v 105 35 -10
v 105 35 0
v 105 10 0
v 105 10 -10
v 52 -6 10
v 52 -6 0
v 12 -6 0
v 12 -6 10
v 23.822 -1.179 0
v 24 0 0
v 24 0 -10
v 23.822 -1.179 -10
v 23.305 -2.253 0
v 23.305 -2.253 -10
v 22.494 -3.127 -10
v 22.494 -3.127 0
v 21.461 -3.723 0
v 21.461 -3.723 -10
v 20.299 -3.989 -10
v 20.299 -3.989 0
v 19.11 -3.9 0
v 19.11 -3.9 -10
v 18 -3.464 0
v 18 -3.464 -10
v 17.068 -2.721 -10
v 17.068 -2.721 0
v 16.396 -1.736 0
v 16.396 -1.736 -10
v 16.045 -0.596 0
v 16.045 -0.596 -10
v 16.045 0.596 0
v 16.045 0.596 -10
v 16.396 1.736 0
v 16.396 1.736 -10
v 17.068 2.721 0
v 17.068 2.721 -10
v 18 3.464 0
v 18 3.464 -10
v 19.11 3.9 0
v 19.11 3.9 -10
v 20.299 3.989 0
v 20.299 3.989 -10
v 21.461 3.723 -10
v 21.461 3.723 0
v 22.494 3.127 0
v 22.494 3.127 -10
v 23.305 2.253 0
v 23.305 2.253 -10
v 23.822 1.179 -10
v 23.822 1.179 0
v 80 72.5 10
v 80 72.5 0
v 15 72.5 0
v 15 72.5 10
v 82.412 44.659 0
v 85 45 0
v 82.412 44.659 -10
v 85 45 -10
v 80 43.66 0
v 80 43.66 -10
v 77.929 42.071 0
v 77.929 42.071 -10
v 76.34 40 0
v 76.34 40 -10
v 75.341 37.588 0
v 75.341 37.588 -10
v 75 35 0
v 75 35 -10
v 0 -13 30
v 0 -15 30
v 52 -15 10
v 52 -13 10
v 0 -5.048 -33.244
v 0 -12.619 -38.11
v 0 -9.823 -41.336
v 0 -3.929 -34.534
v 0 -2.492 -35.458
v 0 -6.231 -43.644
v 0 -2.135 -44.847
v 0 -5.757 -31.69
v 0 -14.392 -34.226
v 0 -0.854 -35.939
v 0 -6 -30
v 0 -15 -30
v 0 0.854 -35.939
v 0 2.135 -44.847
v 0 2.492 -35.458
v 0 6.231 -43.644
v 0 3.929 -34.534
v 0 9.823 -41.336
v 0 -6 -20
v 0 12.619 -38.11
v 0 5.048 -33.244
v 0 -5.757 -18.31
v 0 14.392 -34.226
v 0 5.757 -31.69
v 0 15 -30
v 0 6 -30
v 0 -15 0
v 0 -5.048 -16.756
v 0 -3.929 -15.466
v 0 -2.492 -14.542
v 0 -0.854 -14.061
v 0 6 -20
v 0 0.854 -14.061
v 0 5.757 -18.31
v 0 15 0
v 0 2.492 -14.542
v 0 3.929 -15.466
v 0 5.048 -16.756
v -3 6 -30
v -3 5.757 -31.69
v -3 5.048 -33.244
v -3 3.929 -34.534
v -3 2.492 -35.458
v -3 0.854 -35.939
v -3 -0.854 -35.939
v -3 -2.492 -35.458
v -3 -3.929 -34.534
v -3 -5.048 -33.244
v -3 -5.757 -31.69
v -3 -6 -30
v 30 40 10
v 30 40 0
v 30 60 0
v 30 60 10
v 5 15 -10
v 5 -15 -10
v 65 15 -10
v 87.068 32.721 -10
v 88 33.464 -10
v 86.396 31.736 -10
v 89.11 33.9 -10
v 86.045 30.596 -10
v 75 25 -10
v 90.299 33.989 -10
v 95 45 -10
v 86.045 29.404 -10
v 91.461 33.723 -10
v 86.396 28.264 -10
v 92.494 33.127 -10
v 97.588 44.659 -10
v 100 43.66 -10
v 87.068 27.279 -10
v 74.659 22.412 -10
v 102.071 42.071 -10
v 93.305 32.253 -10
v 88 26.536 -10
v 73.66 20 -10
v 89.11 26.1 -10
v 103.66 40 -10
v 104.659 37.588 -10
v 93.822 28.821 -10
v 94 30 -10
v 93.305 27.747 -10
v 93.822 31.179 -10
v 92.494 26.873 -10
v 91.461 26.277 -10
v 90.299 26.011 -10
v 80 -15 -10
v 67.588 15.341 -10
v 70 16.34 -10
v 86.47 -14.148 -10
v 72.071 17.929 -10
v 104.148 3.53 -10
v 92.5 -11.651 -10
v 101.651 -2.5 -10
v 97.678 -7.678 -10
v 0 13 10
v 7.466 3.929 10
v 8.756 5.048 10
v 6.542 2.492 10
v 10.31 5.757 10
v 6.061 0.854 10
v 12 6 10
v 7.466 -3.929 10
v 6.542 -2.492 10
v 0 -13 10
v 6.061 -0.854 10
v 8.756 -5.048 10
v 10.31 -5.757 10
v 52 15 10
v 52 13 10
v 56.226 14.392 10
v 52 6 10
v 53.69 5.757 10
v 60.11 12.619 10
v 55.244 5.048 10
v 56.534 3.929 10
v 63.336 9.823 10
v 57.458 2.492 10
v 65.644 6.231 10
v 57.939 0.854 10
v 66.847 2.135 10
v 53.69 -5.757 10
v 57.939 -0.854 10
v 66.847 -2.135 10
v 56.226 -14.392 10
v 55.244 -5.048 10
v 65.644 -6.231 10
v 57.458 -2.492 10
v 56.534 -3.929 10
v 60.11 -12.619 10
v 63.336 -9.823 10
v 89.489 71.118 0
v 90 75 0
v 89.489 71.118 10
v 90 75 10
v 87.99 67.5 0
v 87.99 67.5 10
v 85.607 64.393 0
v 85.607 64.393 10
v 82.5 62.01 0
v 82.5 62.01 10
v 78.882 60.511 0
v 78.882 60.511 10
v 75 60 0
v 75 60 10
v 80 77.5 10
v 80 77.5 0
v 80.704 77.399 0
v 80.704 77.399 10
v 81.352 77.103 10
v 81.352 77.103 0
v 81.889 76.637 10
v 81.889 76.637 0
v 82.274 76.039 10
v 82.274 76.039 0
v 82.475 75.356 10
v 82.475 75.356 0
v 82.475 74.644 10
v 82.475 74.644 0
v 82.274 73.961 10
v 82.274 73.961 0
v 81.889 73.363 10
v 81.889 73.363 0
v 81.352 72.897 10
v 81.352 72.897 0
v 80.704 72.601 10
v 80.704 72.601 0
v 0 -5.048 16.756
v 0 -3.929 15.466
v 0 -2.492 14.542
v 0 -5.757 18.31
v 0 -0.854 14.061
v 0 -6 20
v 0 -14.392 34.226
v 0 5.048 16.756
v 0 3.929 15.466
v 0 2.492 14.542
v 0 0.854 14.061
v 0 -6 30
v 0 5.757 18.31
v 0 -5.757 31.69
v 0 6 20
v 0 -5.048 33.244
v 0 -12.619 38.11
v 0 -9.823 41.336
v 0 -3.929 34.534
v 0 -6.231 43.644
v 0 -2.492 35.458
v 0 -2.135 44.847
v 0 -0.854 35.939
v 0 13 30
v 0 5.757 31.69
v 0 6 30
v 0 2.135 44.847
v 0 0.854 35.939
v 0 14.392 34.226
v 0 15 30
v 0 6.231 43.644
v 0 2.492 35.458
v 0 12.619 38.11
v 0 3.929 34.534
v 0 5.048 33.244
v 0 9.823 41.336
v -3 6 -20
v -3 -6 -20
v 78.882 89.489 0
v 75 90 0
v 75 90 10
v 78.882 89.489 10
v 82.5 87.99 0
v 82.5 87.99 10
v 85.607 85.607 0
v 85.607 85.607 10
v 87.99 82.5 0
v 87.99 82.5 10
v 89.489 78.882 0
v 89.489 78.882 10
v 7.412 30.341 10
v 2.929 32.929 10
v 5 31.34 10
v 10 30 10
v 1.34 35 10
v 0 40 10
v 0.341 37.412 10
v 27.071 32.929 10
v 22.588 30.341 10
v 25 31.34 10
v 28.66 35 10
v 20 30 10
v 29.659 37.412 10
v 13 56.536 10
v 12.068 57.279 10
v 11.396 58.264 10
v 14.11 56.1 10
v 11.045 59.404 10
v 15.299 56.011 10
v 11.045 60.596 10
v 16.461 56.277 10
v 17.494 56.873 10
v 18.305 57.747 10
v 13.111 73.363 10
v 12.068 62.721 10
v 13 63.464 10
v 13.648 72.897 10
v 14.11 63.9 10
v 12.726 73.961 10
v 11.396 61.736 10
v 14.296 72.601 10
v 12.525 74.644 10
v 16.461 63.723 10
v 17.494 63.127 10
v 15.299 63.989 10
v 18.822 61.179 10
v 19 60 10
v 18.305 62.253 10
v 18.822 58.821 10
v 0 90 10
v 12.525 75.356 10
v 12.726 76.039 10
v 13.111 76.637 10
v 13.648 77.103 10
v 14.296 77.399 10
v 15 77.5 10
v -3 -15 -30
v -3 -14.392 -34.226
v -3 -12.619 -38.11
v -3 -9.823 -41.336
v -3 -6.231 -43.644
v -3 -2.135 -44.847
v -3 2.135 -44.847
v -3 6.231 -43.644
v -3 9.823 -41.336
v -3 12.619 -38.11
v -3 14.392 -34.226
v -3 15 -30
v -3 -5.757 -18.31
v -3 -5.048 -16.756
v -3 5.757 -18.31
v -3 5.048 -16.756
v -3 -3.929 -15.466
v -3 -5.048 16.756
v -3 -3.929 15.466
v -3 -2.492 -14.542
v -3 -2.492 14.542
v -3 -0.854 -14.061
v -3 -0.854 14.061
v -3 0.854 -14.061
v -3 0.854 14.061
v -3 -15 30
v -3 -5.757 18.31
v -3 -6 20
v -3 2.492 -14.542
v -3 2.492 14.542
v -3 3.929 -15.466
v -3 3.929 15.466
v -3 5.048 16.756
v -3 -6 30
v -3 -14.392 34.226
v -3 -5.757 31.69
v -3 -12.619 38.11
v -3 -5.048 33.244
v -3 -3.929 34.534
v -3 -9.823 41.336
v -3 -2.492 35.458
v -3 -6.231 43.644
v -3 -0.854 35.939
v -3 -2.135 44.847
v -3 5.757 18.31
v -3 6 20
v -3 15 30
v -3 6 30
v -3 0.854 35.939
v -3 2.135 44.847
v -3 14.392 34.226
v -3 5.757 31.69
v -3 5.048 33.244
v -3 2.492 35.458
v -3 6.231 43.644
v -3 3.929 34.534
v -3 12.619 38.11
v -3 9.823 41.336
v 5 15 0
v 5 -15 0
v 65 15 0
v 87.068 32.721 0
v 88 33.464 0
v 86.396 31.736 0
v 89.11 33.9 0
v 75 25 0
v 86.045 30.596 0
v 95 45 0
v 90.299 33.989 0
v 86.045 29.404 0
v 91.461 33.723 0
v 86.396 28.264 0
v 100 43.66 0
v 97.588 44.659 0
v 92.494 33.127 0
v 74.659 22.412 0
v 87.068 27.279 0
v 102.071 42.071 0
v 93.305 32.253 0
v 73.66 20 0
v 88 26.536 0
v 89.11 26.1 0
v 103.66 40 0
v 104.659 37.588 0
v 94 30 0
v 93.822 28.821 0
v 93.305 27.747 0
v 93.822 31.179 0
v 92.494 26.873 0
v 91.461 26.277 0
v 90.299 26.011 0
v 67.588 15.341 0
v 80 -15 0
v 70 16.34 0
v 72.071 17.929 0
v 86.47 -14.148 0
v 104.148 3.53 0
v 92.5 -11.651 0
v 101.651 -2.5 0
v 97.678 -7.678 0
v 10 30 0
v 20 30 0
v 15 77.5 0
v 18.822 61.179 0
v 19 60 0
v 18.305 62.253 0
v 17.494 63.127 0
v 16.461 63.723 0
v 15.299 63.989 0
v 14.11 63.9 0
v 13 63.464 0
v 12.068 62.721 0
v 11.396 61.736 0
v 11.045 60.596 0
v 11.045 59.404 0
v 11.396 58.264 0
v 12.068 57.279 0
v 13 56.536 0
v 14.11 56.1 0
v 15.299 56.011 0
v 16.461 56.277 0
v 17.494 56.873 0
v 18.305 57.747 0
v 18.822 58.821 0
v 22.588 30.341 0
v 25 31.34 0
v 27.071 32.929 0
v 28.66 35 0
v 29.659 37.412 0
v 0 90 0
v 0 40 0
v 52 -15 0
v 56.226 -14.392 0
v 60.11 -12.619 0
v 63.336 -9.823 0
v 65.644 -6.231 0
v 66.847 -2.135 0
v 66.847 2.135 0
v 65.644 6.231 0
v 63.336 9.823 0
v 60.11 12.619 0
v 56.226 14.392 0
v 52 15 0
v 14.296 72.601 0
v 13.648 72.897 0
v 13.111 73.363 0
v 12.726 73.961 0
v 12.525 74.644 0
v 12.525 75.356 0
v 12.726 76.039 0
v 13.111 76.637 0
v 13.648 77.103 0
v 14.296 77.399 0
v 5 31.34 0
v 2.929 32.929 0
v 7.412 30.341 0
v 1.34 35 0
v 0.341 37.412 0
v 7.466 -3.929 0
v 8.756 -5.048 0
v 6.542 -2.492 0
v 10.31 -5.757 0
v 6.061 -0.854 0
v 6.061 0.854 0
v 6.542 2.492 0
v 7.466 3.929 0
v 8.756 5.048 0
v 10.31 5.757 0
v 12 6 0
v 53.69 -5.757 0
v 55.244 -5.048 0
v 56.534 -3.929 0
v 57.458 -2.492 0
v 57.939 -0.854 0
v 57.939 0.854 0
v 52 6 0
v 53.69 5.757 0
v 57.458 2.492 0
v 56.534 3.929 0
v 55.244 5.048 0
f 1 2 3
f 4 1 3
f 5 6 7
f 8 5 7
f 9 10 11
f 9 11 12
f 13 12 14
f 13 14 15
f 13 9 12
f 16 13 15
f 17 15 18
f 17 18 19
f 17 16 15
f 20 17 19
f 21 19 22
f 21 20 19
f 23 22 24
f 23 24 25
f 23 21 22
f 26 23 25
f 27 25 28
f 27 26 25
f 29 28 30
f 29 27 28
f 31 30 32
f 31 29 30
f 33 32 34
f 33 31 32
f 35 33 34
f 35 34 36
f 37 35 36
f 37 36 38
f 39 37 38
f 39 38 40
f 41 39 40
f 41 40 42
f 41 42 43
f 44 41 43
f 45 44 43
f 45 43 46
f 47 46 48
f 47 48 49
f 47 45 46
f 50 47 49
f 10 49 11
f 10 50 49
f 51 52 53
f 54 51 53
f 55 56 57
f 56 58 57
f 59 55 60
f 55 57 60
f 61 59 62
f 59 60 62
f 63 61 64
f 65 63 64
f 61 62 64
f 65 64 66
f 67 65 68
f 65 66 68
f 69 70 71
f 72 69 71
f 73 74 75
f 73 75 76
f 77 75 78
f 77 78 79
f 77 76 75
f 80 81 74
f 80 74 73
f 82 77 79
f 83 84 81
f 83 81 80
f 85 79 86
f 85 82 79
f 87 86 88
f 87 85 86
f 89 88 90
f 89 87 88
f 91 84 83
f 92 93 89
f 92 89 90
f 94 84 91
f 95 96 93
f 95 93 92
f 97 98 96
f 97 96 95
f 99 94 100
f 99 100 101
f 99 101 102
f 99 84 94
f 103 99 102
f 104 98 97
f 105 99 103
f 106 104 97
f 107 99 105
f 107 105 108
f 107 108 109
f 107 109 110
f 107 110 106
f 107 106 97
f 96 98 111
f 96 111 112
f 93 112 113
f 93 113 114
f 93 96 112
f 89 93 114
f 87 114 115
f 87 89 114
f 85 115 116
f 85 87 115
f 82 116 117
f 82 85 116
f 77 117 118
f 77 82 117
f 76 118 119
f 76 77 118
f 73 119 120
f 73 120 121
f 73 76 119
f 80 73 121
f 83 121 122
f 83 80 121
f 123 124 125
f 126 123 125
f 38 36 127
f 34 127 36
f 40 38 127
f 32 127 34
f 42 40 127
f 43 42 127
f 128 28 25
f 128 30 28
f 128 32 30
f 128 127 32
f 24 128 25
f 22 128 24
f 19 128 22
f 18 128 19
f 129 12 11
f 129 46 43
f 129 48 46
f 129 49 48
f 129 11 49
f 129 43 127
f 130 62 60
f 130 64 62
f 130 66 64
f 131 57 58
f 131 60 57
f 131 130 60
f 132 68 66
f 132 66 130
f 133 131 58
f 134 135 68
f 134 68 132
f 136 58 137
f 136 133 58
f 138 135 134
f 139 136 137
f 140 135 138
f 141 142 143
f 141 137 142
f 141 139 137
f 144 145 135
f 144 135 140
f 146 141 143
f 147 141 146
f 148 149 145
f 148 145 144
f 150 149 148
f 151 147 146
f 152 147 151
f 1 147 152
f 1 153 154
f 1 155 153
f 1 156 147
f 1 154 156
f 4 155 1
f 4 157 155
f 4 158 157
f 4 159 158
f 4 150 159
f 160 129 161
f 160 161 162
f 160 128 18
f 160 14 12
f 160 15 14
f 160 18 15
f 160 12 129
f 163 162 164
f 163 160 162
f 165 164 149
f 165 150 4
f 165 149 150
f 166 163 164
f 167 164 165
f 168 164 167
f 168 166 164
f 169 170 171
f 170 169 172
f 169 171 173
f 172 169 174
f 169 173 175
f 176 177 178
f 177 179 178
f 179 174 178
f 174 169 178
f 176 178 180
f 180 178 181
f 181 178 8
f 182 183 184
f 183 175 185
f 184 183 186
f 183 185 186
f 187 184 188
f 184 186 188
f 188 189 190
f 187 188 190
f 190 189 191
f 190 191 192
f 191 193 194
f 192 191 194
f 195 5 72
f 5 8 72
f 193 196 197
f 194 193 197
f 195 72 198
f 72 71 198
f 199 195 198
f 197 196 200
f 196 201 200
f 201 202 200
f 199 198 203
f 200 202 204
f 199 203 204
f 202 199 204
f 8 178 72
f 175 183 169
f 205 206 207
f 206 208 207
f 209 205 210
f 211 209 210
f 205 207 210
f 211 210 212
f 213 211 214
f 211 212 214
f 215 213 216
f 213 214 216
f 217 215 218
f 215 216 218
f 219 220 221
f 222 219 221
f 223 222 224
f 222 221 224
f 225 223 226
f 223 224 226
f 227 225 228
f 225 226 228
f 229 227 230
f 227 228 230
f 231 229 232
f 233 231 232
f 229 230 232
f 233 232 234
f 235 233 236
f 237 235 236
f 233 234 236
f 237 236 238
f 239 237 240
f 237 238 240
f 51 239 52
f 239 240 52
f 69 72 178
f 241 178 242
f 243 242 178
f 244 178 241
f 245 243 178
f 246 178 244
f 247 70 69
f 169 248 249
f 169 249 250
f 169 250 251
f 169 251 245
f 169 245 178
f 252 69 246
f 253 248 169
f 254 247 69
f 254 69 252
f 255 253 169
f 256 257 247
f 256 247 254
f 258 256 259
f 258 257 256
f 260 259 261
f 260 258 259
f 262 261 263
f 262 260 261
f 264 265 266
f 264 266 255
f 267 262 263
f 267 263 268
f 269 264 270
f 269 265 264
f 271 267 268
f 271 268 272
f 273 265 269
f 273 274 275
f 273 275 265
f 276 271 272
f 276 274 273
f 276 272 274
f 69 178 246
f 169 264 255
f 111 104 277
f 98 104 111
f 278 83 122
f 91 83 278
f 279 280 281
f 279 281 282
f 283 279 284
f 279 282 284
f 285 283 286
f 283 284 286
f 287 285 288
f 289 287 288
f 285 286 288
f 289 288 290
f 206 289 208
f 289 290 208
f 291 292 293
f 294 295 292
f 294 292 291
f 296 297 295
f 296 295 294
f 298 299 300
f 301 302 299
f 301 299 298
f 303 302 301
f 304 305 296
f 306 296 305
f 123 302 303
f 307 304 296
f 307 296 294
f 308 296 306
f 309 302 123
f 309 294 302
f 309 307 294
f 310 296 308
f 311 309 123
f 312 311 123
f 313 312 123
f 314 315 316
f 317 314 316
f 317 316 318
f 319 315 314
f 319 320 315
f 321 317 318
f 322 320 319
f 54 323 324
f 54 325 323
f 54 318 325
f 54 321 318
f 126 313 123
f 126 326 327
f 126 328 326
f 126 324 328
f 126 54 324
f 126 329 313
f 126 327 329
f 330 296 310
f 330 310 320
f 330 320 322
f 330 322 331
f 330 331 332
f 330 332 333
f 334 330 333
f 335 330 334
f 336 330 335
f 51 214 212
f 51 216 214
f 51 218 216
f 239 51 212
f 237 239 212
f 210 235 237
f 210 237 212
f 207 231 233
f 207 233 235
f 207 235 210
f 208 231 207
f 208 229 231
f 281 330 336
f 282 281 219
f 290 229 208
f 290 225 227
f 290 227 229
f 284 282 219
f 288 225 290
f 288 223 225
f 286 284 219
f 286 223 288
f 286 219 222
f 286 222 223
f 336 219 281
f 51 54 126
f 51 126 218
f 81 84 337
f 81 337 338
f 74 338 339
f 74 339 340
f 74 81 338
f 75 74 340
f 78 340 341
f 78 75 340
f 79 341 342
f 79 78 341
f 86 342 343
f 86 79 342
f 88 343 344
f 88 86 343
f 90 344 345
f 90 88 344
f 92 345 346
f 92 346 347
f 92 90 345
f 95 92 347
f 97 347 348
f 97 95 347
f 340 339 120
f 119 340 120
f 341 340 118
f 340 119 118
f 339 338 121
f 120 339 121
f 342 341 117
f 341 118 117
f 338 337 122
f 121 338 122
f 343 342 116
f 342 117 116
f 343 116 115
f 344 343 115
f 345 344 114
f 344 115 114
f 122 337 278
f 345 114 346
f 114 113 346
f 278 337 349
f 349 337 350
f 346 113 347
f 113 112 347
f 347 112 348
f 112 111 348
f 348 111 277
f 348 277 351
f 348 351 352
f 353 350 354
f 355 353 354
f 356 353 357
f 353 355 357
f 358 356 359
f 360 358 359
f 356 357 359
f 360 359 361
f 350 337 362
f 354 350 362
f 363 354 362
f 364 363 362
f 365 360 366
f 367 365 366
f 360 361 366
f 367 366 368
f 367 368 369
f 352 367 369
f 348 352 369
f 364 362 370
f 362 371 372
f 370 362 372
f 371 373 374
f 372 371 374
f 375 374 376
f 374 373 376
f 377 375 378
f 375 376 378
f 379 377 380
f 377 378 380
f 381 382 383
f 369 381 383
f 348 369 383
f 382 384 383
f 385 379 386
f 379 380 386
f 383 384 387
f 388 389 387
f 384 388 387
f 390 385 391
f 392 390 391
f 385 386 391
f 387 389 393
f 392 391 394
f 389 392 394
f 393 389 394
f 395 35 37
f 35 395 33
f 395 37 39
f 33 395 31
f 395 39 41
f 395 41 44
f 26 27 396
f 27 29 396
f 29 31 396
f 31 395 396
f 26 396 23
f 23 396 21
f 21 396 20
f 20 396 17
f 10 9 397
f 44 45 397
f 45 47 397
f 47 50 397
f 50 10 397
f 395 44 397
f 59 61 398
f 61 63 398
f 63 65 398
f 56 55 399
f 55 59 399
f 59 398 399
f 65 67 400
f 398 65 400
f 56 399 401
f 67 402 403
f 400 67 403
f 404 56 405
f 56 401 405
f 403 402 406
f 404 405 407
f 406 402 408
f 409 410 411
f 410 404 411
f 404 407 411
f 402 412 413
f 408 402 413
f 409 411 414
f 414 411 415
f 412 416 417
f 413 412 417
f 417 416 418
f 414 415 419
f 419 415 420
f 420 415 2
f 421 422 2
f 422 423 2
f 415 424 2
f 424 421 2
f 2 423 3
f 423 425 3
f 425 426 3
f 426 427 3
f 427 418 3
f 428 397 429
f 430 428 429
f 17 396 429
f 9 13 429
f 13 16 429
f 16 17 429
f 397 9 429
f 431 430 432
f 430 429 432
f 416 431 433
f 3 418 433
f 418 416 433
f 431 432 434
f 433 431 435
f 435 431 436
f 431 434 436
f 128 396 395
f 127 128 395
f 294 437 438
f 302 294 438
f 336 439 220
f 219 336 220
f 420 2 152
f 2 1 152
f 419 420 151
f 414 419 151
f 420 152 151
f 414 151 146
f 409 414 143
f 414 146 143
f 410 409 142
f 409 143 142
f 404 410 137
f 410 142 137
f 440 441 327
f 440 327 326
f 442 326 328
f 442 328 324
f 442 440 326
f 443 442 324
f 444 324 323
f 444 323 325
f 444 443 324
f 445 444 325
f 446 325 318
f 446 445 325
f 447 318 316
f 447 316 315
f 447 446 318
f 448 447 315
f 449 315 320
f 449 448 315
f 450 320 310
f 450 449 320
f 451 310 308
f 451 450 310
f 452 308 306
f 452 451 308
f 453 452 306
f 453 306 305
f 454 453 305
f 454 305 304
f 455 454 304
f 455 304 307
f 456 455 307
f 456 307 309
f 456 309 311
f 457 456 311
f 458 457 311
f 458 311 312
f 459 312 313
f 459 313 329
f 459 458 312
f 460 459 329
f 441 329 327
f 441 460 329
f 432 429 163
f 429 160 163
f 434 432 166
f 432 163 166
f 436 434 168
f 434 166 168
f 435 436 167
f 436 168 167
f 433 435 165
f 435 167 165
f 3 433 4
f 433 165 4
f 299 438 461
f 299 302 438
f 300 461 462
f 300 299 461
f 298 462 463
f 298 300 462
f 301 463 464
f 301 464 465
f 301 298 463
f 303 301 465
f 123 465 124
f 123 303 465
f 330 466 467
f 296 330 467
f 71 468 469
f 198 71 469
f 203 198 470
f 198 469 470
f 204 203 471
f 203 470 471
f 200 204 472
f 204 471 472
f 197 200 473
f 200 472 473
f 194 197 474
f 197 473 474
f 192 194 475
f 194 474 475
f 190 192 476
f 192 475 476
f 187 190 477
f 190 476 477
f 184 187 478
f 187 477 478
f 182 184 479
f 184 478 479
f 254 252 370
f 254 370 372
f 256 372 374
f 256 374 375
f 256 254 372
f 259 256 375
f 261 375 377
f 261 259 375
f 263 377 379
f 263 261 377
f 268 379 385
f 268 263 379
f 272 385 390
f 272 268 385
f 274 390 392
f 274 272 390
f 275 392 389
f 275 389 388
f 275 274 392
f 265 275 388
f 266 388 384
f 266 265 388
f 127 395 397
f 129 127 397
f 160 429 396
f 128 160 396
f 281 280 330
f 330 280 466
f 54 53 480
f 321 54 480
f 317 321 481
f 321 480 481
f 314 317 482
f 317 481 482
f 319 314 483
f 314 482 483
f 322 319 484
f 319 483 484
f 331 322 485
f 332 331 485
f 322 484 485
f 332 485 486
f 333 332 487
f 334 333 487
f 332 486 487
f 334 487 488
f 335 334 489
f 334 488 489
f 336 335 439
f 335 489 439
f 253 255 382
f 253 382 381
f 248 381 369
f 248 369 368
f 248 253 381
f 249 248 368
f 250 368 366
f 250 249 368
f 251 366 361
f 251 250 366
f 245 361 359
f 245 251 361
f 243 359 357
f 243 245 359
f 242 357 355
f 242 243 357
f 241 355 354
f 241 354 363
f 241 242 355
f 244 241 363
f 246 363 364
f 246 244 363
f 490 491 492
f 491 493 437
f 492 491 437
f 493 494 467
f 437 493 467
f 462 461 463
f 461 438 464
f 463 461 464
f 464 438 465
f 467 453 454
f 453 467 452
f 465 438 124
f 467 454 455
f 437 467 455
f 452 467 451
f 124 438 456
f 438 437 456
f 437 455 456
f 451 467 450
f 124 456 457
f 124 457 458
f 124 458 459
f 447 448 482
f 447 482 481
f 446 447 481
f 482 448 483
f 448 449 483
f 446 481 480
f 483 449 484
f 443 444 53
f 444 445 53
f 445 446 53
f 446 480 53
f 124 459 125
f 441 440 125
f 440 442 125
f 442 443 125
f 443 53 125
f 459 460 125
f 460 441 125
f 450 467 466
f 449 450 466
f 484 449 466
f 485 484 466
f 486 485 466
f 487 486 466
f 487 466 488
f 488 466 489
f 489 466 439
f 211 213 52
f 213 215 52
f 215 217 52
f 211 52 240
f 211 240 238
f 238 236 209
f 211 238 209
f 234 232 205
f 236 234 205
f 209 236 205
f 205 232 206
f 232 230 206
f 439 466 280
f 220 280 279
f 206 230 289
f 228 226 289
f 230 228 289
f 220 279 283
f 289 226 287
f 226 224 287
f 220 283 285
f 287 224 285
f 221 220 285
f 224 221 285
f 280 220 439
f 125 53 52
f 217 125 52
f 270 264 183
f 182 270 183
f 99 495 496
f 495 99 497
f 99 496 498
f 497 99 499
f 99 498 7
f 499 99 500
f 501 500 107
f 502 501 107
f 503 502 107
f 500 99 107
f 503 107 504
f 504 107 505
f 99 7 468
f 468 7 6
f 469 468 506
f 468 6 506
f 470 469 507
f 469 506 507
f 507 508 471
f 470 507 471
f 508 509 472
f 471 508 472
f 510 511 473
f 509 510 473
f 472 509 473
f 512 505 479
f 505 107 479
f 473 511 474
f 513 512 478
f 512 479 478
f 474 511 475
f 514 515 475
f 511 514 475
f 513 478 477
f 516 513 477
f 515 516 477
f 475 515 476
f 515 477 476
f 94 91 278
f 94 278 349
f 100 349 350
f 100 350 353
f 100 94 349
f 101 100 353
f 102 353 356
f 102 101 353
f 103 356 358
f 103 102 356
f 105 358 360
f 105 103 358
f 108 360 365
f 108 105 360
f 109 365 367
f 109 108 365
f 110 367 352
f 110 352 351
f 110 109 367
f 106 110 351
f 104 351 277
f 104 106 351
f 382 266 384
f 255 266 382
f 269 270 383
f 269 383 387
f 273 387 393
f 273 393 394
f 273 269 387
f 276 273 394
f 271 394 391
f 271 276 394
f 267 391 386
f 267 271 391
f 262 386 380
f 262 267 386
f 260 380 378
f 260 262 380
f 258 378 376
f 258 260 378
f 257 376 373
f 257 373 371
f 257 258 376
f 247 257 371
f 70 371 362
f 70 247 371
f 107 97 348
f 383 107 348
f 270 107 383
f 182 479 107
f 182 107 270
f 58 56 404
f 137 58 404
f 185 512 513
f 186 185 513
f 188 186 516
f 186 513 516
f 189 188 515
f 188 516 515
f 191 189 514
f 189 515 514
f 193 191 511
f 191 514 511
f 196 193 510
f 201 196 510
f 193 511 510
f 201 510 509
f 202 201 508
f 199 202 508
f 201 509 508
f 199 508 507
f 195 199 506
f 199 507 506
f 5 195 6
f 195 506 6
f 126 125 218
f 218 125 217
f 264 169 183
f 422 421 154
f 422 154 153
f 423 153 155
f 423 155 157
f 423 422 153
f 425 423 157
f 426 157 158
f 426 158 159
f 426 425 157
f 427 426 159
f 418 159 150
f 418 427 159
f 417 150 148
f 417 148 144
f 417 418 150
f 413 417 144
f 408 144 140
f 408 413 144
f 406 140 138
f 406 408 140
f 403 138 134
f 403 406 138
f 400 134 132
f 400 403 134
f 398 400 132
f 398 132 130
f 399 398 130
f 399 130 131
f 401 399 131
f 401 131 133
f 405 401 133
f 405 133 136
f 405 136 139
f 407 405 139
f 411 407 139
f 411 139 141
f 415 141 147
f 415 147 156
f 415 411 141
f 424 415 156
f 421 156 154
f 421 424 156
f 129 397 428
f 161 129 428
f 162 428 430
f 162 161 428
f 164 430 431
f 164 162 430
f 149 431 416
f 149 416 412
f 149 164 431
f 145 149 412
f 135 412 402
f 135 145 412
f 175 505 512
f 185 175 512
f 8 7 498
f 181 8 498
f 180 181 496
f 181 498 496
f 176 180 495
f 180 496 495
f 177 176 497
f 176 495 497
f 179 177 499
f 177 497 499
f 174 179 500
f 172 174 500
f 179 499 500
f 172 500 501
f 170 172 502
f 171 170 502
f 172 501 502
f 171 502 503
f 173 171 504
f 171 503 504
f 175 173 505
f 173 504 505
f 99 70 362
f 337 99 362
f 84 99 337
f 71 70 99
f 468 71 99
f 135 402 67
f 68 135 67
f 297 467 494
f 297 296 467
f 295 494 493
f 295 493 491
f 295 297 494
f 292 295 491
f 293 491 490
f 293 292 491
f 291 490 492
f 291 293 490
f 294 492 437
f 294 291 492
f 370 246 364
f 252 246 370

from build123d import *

# Parameters (mm, degrees)
F1_DEPTH  = 10
F3_DEPTH  = 3
F4_R      = 4
F5_DEPTH  = 10
F6_R      = 25
F7_R      = 10
F8_DEPTH  = 30
F9_W      = 23.3748118877
F9_H      = 20
F10_DEPTH = 30
F13_R     = 4
F14_DEPTH = 10
F15_R     = 14.99999
F16_R     = 10


# Not quite as in the source:
# - a fillet or chamfer is up to 0.001 mm smaller than in the source, because OpenCascade refuses the exact size


with BuildPart() as f1:
    # F0 (on Top) → F1 (new body)
    with BuildSketch(Plane.XY):
        with BuildLine():
            Line((52, 15), (0, 15))
            Line((0, 15), (0, 13))
            Line((0, 13), (52, 13))
            ThreePointArc((52, 13), (65, 0), (52, -13))
            Line((52, -13), (0, -13))
            Line((0, -13), (0, -15))
            Line((0, -15), (52, -15))
            ThreePointArc((52, -15), (67, 0), (52, 15))
        make_face()
        with BuildLine():
            Line((52, 13), (0, 13))
            Line((0, 13), (0, -13))
            Line((0, -13), (52, -13))
            ThreePointArc((52, -13), (65, 0), (52, 13))
        make_face()
        with BuildLine():
            Line((12, 6), (52, 6))
            ThreePointArc((52, 6), (58, 0), (52, -6))
            Line((52, -6), (12, -6))
            ThreePointArc((12, -6), (6, 0), (12, 6))
        make_face(mode=Mode.SUBTRACT)
    extrude(amount=F1_DEPTH)

    # F2 (on Right) → F3 (join)
    with BuildSketch(Plane.YZ):
        with BuildLine():
            Line((-15, 30), (-15, 0))
            Line((-15, 0), (-15, -30))
            ThreePointArc((-15, -30), (0, -45), (15, -30))
            Line((15, -30), (15, 0))
            Line((15, 0), (15, 30))
            ThreePointArc((15, 30), (0, 45), (-15, 30))
        make_face()
        with BuildLine():
            Line((6, -20), (6, -30))
            ThreePointArc((6, -30), (0, -36), (-6, -30))
            Line((-6, -30), (-6, -20))
            ThreePointArc((-6, -20), (0, -14), (6, -20))
        make_face(mode=Mode.SUBTRACT)
        with BuildLine():
            Line((-6, 20), (-6, 30))
            ThreePointArc((-6, 30), (0, 36), (6, 30))
            Line((6, 30), (6, 20))
            ThreePointArc((6, 20), (0, 14), (-6, 20))
        make_face(mode=Mode.SUBTRACT)
    extrude(amount=-F3_DEPTH)

    # F0 (on Top) → F8 (join)
    with BuildSketch(Plane.XY):
        with BuildLine():
            Line((52, 15), (0, 15))
            Line((0, 15), (0, 13))
            Line((0, 13), (52, 13))
            ThreePointArc((52, 13), (65, 0), (52, -13))
            Line((52, -13), (0, -13))
            Line((0, -13), (0, -15))
            Line((0, -15), (52, -15))
            ThreePointArc((52, -15), (67, 0), (52, 15))
        make_face()
    extrude(amount=F8_DEPTH)

    # F9 (on face) → F10 (cut)
    with BuildSketch(Plane.XZ.offset(15)):
        with Locations((63.6874059439, 20)):
            Rectangle(F9_W, F9_H)
        Polygon((52, 30), (0, 30), (52, 10), align=None)
    extrude(amount=-F10_DEPTH, mode=Mode.SUBTRACT)


with BuildPart() as f5:
    # F4 (on face) → F5 (new body)
    with BuildSketch(Plane(origin=(0, 0, 0), x_dir=(1, 0, 0), z_dir=(0, 0, -1))):
        with BuildLine():
            Line((52, 15), (5, 15))
            Line((5, 15), (5, -15))
            Line((5, -15), (52, -15))
            ThreePointArc((52, -15), (67, 0), (52, 15))
        make_face()
        with BuildLine():
            Line((52, -6), (12, -6))
            ThreePointArc((12, -6), (6, 0), (12, 6))
            Line((12, 6), (52, 6))
            ThreePointArc((52, 6), (58, 0), (52, -6))
        make_face(mode=Mode.SUBTRACT)
        with BuildLine():
            Line((105, 15), (52, 15))
            ThreePointArc((52, 15), (67, 0), (52, -15))
            Line((52, -15), (75, -15))
            Line((75, -15), (75, -45))
            Line((75, -45), (105, -45))
            Line((105, -45), (105, 15))
        make_face()
        with Locations((90, -30)):
            Circle(F4_R, mode=Mode.SUBTRACT)
        with BuildLine():
            ThreePointArc((12, 6), (6, 0), (12, -6))
            Line((12, -6), (52, -6))
            ThreePointArc((52, -6), (58, 0), (52, 6))
            Line((52, 6), (12, 6))
        make_face()
        with Locations((20, 0)):
            Circle(F4_R, mode=Mode.SUBTRACT)
    extrude(amount=F5_DEPTH)

    # F6
    f6_edges = [f5.edges().sort_by_distance(p)[0] for p in [
        (105, -15, -5),
    ]]
    fillet(f6_edges, radius=F6_R)

    # F7
    f7_edges = [f5.edges().sort_by_distance(p)[0] for p in [
        (75, 45, -5),
        (105, 45, -5),
        (75, 15, -5),
    ]]
    fillet(f7_edges, radius=F7_R)


with BuildPart() as f14:
    # F13 (on Top) → F14 (new body)
    with BuildSketch(Plane.XY):
        Polygon((90, 90), (0, 90), (0, 30), (30, 30), (30, 60), (90, 60), align=None)
        with Locations((15, 60)):
            Circle(F13_R, mode=Mode.SUBTRACT)
        with BuildLine():
            Line((15, 77.5), (80, 77.5))
            ThreePointArc((80, 77.5), (82.5, 75), (80, 72.5))
            Line((80, 72.5), (15, 72.5))
            ThreePointArc((15, 72.5), (12.5, 75), (15, 77.5))
        make_face(mode=Mode.SUBTRACT)
    extrude(amount=F14_DEPTH)

    # F15 (radius 15 in the source; OpenCascade refuses exactly that, so slightly less here)
    f15_edges = [f14.edges().sort_by_distance(p)[0] for p in [
        (90, 60, 5),
        (90, 90, 5),
    ]]
    fillet(f15_edges, radius=F15_R)

    # F16
    f16_edges = [f14.edges().sort_by_distance(p)[0] for p in [
        (0, 30, 5),
        (30, 30, 5),
    ]]
    fillet(f16_edges, radius=F16_R)


solid = Compound([f1.part, f5.part, f14.part])
